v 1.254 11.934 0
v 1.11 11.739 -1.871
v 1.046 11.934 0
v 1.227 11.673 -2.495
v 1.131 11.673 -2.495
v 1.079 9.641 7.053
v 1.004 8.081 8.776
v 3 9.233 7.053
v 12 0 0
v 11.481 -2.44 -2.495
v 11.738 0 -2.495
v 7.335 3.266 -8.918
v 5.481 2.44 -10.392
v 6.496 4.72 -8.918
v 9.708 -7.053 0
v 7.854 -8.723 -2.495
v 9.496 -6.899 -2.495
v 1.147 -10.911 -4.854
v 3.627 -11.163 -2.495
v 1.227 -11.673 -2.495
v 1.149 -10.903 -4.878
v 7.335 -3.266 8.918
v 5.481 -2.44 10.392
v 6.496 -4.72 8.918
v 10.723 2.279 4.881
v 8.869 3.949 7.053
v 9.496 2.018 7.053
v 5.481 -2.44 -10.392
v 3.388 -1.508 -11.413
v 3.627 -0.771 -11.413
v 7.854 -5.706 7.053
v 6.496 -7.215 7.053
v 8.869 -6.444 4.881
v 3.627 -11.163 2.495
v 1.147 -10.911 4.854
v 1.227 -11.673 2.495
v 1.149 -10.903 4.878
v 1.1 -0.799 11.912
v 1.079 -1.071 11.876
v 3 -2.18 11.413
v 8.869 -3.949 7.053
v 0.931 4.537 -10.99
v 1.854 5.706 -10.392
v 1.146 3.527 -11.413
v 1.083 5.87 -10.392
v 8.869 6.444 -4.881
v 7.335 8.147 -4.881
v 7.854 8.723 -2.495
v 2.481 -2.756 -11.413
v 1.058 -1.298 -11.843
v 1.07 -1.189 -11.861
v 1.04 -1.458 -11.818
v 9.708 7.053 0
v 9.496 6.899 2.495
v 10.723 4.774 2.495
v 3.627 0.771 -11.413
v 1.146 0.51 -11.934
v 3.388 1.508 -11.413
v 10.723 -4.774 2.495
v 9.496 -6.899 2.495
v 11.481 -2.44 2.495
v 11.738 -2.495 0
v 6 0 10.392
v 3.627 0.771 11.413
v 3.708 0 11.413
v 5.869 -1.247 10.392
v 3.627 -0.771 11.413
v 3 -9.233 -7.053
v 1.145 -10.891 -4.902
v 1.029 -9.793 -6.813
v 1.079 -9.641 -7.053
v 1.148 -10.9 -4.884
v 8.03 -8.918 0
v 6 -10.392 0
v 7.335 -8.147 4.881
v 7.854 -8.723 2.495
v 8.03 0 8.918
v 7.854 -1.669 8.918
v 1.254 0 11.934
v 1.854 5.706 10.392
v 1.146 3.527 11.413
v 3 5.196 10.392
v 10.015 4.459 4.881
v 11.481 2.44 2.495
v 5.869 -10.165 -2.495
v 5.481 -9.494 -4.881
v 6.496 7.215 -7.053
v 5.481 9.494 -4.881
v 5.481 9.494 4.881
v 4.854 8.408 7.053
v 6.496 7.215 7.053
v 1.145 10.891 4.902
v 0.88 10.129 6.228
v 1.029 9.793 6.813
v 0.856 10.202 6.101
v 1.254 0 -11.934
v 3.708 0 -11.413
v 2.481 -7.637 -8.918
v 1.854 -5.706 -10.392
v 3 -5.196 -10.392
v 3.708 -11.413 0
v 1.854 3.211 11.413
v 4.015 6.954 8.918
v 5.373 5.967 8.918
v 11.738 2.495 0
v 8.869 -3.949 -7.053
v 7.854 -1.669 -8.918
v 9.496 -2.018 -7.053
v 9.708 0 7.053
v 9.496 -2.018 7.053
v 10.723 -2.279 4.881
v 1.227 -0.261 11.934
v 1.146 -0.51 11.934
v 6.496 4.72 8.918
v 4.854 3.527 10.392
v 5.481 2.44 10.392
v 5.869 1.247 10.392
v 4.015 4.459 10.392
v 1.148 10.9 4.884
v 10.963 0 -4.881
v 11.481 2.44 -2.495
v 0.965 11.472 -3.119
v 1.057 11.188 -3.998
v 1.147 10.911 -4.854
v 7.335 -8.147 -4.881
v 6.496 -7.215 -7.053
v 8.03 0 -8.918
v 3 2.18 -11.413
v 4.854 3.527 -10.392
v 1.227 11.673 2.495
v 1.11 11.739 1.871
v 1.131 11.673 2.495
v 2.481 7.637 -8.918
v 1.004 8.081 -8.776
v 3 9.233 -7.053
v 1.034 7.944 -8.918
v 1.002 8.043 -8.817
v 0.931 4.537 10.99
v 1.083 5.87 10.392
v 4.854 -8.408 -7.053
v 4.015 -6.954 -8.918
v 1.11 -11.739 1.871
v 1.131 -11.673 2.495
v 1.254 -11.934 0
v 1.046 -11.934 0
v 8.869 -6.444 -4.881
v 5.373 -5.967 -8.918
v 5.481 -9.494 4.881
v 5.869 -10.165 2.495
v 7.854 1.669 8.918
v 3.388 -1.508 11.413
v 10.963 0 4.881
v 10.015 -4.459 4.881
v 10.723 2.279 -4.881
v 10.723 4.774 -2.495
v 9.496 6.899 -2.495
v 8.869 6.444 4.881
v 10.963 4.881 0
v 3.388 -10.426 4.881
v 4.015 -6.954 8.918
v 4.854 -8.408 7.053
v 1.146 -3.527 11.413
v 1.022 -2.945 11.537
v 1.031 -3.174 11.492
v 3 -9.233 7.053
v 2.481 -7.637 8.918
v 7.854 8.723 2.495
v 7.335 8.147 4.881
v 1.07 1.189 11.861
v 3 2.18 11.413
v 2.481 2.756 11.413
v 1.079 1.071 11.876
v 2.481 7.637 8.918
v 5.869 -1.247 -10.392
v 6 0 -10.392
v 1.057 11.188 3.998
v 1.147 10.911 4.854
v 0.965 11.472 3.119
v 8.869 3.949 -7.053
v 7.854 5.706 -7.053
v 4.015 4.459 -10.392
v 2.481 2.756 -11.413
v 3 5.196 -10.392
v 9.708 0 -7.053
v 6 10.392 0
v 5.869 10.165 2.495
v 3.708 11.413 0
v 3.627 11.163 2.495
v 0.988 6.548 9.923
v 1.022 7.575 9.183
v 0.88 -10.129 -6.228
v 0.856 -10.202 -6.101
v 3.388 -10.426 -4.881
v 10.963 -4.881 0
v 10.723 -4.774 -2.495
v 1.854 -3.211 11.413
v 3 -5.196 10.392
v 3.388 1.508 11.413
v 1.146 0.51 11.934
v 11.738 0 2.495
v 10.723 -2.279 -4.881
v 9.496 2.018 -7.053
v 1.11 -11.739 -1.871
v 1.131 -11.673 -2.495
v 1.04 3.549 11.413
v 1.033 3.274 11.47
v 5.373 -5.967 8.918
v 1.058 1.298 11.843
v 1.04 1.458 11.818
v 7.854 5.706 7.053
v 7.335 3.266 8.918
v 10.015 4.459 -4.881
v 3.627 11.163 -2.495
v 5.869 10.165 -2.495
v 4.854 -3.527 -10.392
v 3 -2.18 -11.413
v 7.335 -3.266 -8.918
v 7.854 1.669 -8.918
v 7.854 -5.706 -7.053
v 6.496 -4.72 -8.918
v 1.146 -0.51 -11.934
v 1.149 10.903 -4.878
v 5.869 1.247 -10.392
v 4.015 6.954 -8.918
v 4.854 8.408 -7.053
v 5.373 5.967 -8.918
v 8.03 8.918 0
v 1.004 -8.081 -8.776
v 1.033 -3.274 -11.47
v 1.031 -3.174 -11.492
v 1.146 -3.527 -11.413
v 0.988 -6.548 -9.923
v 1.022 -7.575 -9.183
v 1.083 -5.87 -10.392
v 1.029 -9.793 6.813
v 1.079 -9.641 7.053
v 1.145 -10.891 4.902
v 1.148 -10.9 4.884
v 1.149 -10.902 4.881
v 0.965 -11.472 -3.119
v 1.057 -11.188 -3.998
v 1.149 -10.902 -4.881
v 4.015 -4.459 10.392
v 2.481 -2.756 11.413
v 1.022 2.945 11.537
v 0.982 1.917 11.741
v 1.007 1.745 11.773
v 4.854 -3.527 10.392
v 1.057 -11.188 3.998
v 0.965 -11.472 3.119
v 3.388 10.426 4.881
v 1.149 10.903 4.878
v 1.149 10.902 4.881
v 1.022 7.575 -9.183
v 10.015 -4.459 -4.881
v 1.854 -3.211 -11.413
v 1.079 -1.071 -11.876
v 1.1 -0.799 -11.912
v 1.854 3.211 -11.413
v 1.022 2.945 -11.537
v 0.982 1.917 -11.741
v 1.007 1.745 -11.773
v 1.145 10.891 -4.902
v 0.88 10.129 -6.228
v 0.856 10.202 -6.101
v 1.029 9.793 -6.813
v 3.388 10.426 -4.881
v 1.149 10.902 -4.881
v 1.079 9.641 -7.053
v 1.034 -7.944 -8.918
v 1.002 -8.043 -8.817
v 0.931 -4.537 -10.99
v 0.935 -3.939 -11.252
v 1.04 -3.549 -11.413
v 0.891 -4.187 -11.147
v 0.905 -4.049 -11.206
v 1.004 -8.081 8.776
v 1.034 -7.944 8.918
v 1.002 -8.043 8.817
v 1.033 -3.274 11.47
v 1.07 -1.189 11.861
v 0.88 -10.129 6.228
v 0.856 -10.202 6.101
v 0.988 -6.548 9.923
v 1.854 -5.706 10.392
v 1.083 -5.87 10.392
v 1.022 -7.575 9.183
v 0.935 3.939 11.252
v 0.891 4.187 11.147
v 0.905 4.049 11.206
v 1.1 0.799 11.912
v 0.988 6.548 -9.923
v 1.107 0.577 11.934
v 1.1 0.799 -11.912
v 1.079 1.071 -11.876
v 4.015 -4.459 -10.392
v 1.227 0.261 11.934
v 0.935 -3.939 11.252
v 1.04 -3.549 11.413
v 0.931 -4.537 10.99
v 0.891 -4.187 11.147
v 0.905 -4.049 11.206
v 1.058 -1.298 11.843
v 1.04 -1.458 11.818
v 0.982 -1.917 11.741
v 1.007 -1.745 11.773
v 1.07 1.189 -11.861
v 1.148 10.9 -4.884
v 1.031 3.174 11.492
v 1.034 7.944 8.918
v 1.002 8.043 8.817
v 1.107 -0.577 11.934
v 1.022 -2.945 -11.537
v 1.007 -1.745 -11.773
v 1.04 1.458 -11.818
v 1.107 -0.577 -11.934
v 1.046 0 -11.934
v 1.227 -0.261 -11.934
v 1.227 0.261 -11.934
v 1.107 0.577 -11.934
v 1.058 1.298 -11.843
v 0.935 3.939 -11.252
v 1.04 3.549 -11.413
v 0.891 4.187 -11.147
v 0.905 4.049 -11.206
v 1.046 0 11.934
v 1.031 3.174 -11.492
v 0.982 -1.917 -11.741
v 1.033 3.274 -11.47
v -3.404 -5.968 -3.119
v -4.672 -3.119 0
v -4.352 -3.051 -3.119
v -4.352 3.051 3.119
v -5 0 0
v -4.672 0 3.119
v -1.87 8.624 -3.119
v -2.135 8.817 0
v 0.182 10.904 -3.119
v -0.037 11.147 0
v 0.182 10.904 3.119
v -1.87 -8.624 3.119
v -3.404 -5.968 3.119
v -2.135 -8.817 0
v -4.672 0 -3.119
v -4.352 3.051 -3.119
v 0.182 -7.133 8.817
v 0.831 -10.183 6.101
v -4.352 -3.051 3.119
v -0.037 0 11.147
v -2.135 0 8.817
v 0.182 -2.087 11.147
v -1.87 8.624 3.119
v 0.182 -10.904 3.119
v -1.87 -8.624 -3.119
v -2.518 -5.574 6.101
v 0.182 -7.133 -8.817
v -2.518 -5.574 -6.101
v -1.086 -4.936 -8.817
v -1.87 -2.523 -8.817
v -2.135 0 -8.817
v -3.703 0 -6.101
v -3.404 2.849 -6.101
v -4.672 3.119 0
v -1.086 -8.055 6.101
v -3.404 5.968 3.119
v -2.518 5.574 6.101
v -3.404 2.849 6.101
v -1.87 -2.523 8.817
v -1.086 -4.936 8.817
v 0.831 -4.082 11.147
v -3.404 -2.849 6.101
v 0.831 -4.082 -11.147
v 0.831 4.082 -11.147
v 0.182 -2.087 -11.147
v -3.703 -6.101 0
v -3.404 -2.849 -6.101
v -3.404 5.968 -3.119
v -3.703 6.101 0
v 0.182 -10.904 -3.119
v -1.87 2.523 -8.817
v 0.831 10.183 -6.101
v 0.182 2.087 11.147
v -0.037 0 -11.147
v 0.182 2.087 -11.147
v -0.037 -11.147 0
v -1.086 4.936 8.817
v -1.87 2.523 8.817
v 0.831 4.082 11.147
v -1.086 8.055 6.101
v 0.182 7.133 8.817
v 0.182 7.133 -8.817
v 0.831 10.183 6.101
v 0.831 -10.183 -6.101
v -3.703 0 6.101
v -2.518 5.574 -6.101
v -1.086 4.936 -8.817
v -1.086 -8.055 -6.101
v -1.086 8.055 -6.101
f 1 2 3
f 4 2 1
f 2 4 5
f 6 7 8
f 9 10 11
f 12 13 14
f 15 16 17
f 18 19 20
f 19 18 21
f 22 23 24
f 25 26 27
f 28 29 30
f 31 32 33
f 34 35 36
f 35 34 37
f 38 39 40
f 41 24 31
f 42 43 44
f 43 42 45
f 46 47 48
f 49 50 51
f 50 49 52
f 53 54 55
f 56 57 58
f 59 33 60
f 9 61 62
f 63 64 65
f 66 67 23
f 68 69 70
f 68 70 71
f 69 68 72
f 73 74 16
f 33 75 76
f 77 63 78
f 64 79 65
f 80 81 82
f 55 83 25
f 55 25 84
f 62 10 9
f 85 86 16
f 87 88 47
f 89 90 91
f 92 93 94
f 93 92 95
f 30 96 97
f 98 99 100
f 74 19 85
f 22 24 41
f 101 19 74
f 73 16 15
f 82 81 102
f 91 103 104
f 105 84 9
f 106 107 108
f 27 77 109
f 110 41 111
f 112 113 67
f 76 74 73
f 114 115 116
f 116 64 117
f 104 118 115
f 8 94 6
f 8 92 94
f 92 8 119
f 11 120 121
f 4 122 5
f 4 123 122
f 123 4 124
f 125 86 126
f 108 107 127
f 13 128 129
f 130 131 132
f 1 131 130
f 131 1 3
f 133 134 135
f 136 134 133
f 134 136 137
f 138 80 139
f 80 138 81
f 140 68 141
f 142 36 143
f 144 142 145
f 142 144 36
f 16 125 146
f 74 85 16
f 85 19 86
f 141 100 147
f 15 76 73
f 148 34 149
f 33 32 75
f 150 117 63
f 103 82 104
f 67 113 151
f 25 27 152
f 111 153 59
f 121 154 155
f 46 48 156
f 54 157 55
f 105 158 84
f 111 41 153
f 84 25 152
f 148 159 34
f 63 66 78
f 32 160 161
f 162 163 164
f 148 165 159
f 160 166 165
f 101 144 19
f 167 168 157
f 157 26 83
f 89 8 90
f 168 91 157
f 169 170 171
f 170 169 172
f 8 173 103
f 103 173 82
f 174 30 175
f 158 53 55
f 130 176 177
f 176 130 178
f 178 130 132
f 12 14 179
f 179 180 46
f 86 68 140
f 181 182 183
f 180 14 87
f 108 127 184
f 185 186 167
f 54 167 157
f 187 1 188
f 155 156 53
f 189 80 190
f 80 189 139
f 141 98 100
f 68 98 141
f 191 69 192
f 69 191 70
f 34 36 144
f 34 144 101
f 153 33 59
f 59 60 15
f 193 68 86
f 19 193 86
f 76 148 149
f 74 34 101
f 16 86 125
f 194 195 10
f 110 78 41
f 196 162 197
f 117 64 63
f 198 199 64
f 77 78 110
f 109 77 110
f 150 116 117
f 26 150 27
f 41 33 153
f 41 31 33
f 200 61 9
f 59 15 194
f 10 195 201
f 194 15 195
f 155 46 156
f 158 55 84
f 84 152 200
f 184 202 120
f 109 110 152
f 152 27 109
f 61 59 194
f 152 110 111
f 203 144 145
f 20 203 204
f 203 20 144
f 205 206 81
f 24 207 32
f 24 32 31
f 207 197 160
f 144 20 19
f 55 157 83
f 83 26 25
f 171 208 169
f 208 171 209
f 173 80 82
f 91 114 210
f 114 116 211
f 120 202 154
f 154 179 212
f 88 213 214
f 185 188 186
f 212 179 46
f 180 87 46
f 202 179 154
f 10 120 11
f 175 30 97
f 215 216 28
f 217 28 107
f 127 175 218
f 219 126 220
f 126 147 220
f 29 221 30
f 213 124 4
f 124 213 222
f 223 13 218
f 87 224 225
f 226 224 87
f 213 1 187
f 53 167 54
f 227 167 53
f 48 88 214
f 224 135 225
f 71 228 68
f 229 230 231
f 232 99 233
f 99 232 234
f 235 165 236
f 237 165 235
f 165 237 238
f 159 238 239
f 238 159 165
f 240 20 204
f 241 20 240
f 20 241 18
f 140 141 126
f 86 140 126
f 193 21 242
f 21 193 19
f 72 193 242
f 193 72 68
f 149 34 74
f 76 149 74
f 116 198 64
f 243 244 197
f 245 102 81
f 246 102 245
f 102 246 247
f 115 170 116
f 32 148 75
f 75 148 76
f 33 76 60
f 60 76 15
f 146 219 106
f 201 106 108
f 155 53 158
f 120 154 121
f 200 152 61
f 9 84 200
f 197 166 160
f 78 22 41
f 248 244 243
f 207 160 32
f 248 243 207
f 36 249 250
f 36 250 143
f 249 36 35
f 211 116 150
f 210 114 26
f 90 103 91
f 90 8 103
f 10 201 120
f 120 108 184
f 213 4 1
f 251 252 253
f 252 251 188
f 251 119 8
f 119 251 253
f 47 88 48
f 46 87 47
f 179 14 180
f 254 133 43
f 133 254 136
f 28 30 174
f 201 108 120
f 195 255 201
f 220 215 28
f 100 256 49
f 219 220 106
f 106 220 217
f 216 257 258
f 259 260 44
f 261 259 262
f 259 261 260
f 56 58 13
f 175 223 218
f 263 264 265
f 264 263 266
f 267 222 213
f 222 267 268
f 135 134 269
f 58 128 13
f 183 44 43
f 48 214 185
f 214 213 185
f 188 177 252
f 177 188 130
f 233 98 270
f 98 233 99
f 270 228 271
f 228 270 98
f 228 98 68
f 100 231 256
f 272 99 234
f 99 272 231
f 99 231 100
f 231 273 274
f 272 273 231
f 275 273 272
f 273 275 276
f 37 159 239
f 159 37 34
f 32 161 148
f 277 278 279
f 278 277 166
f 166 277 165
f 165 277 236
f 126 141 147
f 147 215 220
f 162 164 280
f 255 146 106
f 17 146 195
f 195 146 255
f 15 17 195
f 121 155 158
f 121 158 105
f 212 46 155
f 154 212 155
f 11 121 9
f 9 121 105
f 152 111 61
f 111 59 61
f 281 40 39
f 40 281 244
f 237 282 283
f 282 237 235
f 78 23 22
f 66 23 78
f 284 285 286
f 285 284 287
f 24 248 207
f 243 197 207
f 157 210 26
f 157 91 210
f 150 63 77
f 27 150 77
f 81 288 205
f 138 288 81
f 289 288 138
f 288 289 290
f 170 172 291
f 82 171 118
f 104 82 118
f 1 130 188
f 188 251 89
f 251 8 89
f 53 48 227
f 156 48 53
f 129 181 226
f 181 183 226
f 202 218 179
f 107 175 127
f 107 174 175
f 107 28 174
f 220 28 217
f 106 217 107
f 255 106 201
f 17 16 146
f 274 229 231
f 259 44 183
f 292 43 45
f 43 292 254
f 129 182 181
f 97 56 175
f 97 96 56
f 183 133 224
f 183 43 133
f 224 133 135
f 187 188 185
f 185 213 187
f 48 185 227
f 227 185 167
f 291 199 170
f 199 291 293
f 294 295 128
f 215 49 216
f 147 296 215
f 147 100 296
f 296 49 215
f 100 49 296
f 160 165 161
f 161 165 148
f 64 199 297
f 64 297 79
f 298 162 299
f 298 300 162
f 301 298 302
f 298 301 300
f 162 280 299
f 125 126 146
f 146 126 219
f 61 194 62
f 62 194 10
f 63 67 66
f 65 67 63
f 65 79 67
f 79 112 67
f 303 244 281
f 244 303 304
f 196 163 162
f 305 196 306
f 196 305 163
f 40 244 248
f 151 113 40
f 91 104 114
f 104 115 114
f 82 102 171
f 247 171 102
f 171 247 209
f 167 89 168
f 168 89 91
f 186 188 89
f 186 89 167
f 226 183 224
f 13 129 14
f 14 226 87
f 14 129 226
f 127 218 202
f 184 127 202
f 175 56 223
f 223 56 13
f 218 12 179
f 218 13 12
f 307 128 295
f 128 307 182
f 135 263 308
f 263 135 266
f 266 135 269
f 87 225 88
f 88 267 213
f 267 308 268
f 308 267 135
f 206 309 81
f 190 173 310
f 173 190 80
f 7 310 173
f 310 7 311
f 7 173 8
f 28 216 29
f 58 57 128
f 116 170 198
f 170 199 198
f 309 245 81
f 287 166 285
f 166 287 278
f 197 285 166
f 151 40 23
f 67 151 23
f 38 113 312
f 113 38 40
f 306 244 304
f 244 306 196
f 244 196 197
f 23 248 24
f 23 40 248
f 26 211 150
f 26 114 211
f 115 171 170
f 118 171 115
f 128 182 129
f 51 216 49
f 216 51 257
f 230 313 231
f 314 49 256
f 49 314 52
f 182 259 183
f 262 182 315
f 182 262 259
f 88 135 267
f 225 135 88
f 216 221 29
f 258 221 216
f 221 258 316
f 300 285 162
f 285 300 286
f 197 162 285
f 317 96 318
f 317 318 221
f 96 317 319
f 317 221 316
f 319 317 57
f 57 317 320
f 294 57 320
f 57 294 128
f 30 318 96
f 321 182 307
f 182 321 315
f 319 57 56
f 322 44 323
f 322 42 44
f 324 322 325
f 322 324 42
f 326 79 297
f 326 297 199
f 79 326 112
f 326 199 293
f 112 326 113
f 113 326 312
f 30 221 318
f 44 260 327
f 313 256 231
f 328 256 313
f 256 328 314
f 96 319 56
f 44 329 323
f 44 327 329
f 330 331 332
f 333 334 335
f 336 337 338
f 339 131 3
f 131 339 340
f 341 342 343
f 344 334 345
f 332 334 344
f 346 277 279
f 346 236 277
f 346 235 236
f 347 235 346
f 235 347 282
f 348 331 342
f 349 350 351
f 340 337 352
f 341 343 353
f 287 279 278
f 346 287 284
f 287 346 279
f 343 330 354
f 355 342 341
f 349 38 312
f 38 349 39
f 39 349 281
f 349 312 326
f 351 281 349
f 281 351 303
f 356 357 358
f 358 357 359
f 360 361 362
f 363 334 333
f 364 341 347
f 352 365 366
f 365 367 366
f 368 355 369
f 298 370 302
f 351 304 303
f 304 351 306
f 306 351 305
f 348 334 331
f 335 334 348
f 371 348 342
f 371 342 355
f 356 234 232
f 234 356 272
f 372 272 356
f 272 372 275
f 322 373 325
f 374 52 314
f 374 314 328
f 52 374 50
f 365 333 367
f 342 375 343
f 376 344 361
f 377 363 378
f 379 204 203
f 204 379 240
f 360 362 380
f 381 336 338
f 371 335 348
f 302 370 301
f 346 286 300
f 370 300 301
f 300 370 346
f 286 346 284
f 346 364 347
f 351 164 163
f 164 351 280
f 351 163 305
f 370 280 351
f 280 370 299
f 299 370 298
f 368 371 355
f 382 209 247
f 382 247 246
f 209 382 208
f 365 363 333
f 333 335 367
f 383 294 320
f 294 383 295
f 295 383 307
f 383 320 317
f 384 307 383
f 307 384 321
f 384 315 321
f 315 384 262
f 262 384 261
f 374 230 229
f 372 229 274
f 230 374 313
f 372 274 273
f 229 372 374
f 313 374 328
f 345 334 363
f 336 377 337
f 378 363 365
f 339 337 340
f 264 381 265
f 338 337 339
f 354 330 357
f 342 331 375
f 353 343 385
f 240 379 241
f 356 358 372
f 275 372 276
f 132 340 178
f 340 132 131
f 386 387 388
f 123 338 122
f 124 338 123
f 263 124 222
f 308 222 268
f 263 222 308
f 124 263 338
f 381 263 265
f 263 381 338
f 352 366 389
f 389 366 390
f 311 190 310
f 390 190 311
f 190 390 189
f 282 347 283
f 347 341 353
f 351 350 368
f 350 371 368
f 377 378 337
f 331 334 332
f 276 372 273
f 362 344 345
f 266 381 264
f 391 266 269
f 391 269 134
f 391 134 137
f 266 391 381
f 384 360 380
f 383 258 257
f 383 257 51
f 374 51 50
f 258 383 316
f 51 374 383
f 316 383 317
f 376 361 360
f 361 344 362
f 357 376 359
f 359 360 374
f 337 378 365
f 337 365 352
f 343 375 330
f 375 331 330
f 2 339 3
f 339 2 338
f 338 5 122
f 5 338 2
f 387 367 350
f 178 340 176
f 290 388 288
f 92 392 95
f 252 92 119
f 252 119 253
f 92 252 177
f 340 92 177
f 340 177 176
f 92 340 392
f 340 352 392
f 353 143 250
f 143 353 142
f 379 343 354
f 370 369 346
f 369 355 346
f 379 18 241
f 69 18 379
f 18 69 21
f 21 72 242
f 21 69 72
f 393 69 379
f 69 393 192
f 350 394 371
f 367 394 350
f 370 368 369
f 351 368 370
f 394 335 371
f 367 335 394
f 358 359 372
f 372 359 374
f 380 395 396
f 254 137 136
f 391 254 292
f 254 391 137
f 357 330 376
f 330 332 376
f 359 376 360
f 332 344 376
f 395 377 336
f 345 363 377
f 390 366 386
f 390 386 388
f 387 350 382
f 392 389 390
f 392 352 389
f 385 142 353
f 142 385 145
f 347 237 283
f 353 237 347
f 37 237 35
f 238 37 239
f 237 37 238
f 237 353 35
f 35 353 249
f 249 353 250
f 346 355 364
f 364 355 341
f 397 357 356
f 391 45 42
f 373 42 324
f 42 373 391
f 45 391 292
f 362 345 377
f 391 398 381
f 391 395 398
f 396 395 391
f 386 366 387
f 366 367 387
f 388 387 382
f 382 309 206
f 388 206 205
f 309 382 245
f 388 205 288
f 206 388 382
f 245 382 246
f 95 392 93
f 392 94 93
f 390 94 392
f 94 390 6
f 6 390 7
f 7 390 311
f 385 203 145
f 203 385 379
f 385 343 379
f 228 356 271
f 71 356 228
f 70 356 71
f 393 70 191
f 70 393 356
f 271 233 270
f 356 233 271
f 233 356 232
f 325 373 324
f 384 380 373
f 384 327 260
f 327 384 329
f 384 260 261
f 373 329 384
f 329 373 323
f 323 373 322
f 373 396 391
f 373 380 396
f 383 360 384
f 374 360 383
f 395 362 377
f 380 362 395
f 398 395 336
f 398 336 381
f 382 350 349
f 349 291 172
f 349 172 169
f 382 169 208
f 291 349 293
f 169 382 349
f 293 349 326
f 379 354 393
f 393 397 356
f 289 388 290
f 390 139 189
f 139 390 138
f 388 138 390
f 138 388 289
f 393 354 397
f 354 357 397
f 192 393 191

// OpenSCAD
intersection() {
    sphere(12);
    translate([10,0,0]) sphere(15);
}
